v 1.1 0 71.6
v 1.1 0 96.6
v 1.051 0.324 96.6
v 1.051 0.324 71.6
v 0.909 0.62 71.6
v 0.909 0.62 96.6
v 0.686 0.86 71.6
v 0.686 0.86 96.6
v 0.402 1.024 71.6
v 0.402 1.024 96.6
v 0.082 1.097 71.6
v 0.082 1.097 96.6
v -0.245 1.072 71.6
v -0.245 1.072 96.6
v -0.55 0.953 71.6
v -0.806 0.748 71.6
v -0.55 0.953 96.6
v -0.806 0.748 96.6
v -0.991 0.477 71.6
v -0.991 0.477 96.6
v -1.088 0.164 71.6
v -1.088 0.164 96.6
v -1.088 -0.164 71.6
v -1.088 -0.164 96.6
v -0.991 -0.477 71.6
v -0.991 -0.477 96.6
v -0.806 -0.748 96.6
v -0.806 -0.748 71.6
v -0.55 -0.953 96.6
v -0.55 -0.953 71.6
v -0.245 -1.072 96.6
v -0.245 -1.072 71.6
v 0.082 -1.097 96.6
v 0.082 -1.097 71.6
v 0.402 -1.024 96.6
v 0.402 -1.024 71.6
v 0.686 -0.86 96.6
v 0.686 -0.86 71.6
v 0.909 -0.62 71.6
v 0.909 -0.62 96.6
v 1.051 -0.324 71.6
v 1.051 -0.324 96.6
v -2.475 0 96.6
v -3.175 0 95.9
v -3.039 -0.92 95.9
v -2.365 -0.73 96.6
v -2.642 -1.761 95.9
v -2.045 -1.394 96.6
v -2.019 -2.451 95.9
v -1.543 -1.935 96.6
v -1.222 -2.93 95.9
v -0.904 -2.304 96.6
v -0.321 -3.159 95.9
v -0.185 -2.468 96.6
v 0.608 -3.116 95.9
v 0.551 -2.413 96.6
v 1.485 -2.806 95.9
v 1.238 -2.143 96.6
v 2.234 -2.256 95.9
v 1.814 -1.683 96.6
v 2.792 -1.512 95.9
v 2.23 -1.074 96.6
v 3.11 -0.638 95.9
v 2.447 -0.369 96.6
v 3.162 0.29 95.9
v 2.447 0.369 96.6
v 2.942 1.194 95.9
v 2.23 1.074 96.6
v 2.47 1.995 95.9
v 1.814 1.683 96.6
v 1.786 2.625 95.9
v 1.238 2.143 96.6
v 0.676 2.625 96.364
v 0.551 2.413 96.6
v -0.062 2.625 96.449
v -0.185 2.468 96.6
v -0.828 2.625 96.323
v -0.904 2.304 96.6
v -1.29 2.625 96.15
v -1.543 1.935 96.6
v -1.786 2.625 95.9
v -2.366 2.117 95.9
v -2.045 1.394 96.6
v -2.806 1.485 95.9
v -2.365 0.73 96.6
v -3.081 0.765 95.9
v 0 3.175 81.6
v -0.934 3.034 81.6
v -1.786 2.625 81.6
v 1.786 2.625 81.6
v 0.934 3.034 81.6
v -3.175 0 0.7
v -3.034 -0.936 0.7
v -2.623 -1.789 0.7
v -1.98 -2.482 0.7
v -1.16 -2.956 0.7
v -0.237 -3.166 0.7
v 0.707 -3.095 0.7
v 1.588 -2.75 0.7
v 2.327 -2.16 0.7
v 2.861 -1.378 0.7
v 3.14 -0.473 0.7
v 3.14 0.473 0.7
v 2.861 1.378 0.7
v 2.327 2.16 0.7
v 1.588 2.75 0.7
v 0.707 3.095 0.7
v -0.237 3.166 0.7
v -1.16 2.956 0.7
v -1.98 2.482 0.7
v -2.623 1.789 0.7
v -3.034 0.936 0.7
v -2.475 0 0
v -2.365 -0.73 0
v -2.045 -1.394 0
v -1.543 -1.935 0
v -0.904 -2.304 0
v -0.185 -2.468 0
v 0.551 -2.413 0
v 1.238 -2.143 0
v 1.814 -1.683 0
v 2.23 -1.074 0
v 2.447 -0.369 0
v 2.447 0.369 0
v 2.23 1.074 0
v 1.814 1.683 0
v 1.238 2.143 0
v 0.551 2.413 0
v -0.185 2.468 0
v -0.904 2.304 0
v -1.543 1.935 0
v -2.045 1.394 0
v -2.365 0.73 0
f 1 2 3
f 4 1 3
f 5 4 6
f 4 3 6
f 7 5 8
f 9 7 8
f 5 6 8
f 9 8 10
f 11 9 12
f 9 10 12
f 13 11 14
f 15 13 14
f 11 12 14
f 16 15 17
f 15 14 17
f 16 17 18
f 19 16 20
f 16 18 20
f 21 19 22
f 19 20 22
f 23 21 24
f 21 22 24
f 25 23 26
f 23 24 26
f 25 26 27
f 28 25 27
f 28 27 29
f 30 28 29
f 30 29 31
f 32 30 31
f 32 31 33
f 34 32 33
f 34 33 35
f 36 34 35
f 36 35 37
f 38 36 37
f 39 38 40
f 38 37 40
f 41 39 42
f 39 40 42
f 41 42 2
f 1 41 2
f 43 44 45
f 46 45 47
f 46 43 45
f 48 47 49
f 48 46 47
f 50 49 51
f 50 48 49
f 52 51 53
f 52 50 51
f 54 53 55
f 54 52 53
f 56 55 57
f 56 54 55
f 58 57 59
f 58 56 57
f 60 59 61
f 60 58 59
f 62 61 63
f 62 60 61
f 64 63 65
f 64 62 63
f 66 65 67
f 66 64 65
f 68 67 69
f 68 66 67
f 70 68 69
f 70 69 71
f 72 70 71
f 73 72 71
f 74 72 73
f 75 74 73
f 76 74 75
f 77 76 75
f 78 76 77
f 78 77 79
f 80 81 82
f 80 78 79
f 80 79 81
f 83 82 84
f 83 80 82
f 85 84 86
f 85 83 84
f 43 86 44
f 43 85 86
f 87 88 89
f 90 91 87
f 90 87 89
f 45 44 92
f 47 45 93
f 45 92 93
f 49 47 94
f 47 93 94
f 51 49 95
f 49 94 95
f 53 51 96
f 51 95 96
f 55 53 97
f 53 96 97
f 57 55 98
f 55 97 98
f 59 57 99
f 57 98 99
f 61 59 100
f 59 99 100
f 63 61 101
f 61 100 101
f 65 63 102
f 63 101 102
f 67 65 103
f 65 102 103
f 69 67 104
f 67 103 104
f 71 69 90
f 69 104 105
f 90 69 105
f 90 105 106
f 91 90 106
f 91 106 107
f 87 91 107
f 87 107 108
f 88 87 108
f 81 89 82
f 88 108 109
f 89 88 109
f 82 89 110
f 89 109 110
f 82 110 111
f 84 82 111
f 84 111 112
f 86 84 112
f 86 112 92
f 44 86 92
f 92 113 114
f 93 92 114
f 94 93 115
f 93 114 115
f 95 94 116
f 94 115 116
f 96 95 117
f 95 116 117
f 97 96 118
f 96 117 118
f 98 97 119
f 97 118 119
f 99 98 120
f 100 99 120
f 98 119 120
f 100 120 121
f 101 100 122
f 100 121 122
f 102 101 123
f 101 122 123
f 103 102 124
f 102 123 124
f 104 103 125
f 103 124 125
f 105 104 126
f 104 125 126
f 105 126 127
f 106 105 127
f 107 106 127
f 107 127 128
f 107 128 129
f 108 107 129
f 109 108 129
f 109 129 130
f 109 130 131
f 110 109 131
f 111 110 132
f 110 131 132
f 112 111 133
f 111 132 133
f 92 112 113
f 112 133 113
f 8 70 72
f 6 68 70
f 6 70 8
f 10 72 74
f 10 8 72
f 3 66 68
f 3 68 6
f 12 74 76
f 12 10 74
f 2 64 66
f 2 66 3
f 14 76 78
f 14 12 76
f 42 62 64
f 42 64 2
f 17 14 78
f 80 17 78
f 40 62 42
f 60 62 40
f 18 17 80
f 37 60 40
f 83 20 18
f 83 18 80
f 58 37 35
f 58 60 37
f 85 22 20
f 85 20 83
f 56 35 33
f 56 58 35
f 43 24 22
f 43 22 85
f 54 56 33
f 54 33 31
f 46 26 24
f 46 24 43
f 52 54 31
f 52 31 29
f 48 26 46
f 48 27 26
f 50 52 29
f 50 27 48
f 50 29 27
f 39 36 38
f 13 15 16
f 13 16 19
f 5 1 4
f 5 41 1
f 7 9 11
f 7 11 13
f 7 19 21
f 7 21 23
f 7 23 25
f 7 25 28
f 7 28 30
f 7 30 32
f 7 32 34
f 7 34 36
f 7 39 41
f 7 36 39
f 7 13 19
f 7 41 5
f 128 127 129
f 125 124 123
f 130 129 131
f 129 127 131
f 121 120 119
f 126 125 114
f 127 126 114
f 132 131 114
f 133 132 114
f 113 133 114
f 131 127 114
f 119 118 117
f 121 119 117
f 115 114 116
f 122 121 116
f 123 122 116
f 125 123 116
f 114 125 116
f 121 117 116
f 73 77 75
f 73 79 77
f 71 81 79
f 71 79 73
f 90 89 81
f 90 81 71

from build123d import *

# Parameters (mm, degrees)
IZIM1_R                     = 3.175
Y_KSEKLIK_EKSTR_ZYON1_DEPTH = 96.6
IZIM3_R                     = 1.1
KES_EKSTR_ZYON2_DEPTH       = 25
PAH1_SIZE                   = 0.7
PAH2_SIZE                   = 0.7
CORTE_EXTRUS_O1_START       = -15
CORTE_EXTRUS_O1_DEPTH       = 15


with BuildPart() as part:
    # Çizim1 → Yükseklik-Ekstrüzyon1 (new body)
    with BuildSketch(Plane.XY):
        with Locations(Location((0, 0, 0), (0, 0, 180))):
            Circle(IZIM1_R)
    extrude(amount=Y_KSEKLIK_EKSTR_ZYON1_DEPTH)

    # Çizim3 → Kes-Ekstrüzyon2 (cut)
    with BuildSketch(Plane.XY.offset(96.6)):
        Circle(IZIM3_R)
    extrude(amount=-KES_EKSTR_ZYON2_DEPTH, mode=Mode.SUBTRACT)

    # Pah1
    pah1_edges = [part.edges().sort_by_distance(p)[0] for p in [
        (3.175, 0, 96.6),
    ]]
    chamfer(pah1_edges, length=PAH1_SIZE)

    # Pah2
    pah2_edges = [part.edges().sort_by_distance(p)[0] for p in [
        (3.175, 0, 0),
    ]]
    chamfer(pah2_edges, length=PAH2_SIZE)

    # Esboço1 → Corte-extrusão1 (cut)
    with BuildSketch(Plane.XY.offset(96.6).offset(CORTE_EXTRUS_O1_START)):
        with BuildLine():
            Line((-1.78605711, 2.625), (1.78605711, 2.625))
            ThreePointArc((1.78605711, 2.625), (0, 3.175), (-1.78605711, 2.625))
        make_face()
    extrude(amount=CORTE_EXTRUS_O1_DEPTH, mode=Mode.SUBTRACT)


solid = part.part
